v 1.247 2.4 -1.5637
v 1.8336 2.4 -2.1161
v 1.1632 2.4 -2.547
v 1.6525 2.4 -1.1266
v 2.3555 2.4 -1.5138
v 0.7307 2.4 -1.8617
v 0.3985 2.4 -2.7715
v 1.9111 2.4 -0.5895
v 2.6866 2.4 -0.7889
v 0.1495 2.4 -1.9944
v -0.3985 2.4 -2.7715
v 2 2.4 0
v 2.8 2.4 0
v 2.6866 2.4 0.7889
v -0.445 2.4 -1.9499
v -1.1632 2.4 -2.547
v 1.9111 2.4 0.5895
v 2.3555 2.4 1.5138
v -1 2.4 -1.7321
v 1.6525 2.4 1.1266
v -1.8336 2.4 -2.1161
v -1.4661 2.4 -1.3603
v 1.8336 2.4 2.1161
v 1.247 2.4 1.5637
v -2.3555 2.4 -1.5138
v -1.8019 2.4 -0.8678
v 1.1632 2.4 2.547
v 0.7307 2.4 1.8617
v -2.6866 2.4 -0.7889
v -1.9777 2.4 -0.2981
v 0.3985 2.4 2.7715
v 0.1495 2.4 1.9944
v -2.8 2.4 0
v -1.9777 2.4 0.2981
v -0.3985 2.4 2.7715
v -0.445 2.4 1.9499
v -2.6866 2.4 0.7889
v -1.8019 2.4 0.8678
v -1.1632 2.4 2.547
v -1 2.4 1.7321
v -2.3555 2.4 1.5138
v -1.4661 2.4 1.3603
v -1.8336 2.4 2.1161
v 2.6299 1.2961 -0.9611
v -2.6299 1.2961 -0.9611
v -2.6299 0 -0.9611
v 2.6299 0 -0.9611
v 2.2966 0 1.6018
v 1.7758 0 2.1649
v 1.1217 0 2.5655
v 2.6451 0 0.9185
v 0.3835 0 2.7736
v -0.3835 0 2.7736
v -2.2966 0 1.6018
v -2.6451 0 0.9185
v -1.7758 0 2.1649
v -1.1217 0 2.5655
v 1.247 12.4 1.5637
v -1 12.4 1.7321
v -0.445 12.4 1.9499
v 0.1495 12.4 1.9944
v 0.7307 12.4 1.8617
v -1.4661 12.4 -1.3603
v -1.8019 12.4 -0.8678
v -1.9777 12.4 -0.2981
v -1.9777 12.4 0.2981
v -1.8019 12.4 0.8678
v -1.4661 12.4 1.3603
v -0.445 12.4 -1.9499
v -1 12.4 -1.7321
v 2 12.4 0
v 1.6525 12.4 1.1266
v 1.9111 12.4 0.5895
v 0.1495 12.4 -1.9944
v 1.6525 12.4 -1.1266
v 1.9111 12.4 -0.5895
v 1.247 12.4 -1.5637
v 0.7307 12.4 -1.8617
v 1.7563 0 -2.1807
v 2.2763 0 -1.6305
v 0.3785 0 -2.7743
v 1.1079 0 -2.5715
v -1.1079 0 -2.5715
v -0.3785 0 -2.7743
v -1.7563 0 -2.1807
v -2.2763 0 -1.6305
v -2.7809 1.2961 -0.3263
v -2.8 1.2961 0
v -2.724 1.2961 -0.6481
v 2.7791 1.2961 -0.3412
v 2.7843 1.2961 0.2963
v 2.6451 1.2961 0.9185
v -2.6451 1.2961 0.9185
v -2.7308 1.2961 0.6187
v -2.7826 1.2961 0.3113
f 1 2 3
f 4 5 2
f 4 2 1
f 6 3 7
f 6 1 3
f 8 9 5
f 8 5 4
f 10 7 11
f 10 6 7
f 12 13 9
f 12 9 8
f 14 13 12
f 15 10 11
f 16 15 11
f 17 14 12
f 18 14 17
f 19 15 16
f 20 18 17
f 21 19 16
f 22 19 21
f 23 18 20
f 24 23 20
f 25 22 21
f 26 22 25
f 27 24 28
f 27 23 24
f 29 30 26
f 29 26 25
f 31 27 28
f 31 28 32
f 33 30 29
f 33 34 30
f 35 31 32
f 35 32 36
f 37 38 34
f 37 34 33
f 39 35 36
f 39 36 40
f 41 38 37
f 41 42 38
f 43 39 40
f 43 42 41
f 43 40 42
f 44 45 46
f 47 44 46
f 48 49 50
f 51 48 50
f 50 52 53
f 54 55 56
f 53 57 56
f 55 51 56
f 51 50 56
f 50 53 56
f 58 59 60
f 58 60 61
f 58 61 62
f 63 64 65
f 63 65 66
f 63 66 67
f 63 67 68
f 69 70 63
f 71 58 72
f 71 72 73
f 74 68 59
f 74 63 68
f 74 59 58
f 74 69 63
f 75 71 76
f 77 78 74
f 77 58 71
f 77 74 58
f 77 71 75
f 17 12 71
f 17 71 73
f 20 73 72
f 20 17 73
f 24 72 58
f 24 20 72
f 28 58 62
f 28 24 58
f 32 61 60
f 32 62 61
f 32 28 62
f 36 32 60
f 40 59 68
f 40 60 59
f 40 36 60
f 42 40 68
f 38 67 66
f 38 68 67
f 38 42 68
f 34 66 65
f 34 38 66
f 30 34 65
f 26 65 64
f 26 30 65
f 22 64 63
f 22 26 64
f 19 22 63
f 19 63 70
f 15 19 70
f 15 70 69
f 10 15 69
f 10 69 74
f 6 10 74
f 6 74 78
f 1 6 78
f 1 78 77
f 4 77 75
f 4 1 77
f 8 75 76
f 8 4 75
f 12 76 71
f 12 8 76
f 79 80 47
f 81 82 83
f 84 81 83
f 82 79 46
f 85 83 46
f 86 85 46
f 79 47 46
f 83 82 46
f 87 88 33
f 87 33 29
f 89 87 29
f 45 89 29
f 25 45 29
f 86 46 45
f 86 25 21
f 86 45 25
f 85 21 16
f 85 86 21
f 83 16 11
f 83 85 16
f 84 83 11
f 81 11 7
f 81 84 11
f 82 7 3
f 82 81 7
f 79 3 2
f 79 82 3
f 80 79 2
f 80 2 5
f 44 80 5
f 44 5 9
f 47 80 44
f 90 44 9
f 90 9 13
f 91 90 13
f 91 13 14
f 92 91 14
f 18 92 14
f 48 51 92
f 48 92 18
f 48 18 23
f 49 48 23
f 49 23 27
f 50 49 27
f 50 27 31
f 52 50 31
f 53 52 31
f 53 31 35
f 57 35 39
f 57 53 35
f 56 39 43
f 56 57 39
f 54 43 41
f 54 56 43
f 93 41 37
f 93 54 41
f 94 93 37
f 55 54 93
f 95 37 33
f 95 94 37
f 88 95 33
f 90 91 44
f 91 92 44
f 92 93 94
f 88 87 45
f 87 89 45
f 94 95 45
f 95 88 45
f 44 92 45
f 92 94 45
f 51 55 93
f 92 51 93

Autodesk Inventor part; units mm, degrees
ref_plane "YZ Plane" through (0, 0, 0) normal (1, 0, 0) x (0, 1, 0)
ref_plane "XZ Plane" through (0, 0, 0) normal (0, 1, 0) x (-1, 0, 0)
ref_plane "XY Plane" through (0, 0, 0) normal (0, 0, 1) x (1, 0, 0)
sketch "Esboço1" plane through (0, 0, 0) normal (0, 1, 0) x (-1, 0, 0)
  circle A0 centre (0, 0) radius 2.8
  dimension "d0" = 5.6
extrude "Extrusão1" add sketch "Esboço1" along normal blind 2.4
sketch "Esboço2" plane through (0, 0, 0) normal (1, 0, 0) x (0, 1, 0)
  line L0 (0, 0.9185) -> (1.2961, 0.9185)
  line L1 (1.2961, 0.9185) -> (1.2961, -0.9611)
  line L2 (1.2961, -0.9611) -> (0, -0.9611)
  line L3 (0, -0.9611) -> (0, 0.9185)
  point P0 (0, 0)
extrude "Extrusão2" cut sketch "Esboço2" along normal through all both and the other way through all
sketch "Esboço3" plane through (0, 2.4, 0) normal (0, 1, 0) x (1, 0, 0)
  circle A0 centre (0, 0) radius 2.8 projected
  circle A1 centre (0, 0) radius 2
  dimension "d5" = 4
extrude "Extrusão3" add sketch "Esboço3" along normal blind 10 contours A1
thread "Rosca1" size "M3x0.5" class "6g" standard "ANSI Metric M Profile" full length
properties part number "Parafuso-M4-10"
